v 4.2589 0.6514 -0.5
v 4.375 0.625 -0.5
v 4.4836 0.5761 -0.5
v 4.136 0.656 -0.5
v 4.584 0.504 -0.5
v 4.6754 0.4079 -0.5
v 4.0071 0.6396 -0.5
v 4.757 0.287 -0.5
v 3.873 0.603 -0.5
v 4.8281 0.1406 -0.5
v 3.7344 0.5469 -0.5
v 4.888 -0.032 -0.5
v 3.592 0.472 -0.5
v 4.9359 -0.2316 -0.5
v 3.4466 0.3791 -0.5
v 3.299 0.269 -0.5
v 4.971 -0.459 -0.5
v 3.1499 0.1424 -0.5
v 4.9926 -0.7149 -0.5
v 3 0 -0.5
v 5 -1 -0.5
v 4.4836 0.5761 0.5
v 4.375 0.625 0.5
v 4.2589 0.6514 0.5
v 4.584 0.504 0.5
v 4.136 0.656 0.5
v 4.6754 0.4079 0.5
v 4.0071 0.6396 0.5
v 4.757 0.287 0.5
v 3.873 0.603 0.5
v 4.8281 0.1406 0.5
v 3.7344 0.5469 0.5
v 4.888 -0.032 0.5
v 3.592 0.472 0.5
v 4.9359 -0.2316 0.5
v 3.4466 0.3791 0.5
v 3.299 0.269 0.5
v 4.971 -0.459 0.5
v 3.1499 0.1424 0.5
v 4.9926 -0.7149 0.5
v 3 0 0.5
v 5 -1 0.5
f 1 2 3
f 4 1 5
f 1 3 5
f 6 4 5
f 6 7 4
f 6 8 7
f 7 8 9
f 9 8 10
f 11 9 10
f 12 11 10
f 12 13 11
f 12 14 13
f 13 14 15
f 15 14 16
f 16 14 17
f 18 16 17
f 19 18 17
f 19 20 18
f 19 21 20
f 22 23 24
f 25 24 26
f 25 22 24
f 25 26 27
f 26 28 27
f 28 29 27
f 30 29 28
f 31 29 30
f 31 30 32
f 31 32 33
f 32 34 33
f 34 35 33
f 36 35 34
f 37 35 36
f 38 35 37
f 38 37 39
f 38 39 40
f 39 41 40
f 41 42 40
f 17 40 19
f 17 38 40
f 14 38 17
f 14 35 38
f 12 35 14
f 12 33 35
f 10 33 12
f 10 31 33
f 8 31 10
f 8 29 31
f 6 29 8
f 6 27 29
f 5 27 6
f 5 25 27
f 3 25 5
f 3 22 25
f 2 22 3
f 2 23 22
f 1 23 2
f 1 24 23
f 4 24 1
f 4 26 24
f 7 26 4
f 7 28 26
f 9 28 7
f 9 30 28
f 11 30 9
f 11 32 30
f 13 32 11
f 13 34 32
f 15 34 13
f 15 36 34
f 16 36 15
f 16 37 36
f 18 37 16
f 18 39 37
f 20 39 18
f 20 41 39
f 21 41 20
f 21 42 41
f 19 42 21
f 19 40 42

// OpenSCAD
// Generated by SolidPython 1.1.3 on 2022-09-12 15:11:35


translate(v = [3, 0, 0]) {
	linear_extrude(center = true, height = 1) {
		polygon(points = [[0.0000000000, 0.0000000000], [0.1498750000, 0.1423750000], [0.2990000000, 0.2690000000], [0.4466250000, 0.3791250000], [0.5920000000, 0.4720000000], [0.7343750000, 0.5468750000], [0.8730000000, 0.6030000000], [1.0071250000, 0.6396250000], [1.1360000000, 0.6560000000], [1.2588750000, 0.6513750000], [1.3750000000, 0.6250000000], [1.4836250000, 0.5761250000], [1.5840000000, 0.5040000000], [1.6753750000, 0.4078750000], [1.7570000000, 0.2870000000], [1.8281250000, 0.1406250000], [1.8880000000, -0.0320000000], [1.9358750000, -0.2316250000], [1.9710000000, -0.4590000000], [1.9926250000, -0.7148750000], [2.0000000000, -1.0000000000]]);
	}
}
/***********************************************
*********      SolidPython code:      **********
************************************************
 
# make sure to python3 -m pip install solidpython

from solid import scad_render_to_file
from solid import cube, sphere
from solid.utils import difference

from solid import translate
from solid.splines import catmull_rom_polygon, bezier_polygon
from euclid3 import Point2

points = [ Point2(0,0), Point2(1,1), Point2(2,1), Point2(2,-1) ]
shape = catmull_rom_polygon(points, show_controls=True)

bezier_shape = translate([3,0,0])(bezier_polygon(points, subdivisions=20))

# scad = difference()(
#     cube(10),  # Note the comma between each element!
#     sphere(10)
# ) + cube(3)

scad = bezier_shape

scad_render_to_file(scad, "out.scad")

 
 
************************************************/
